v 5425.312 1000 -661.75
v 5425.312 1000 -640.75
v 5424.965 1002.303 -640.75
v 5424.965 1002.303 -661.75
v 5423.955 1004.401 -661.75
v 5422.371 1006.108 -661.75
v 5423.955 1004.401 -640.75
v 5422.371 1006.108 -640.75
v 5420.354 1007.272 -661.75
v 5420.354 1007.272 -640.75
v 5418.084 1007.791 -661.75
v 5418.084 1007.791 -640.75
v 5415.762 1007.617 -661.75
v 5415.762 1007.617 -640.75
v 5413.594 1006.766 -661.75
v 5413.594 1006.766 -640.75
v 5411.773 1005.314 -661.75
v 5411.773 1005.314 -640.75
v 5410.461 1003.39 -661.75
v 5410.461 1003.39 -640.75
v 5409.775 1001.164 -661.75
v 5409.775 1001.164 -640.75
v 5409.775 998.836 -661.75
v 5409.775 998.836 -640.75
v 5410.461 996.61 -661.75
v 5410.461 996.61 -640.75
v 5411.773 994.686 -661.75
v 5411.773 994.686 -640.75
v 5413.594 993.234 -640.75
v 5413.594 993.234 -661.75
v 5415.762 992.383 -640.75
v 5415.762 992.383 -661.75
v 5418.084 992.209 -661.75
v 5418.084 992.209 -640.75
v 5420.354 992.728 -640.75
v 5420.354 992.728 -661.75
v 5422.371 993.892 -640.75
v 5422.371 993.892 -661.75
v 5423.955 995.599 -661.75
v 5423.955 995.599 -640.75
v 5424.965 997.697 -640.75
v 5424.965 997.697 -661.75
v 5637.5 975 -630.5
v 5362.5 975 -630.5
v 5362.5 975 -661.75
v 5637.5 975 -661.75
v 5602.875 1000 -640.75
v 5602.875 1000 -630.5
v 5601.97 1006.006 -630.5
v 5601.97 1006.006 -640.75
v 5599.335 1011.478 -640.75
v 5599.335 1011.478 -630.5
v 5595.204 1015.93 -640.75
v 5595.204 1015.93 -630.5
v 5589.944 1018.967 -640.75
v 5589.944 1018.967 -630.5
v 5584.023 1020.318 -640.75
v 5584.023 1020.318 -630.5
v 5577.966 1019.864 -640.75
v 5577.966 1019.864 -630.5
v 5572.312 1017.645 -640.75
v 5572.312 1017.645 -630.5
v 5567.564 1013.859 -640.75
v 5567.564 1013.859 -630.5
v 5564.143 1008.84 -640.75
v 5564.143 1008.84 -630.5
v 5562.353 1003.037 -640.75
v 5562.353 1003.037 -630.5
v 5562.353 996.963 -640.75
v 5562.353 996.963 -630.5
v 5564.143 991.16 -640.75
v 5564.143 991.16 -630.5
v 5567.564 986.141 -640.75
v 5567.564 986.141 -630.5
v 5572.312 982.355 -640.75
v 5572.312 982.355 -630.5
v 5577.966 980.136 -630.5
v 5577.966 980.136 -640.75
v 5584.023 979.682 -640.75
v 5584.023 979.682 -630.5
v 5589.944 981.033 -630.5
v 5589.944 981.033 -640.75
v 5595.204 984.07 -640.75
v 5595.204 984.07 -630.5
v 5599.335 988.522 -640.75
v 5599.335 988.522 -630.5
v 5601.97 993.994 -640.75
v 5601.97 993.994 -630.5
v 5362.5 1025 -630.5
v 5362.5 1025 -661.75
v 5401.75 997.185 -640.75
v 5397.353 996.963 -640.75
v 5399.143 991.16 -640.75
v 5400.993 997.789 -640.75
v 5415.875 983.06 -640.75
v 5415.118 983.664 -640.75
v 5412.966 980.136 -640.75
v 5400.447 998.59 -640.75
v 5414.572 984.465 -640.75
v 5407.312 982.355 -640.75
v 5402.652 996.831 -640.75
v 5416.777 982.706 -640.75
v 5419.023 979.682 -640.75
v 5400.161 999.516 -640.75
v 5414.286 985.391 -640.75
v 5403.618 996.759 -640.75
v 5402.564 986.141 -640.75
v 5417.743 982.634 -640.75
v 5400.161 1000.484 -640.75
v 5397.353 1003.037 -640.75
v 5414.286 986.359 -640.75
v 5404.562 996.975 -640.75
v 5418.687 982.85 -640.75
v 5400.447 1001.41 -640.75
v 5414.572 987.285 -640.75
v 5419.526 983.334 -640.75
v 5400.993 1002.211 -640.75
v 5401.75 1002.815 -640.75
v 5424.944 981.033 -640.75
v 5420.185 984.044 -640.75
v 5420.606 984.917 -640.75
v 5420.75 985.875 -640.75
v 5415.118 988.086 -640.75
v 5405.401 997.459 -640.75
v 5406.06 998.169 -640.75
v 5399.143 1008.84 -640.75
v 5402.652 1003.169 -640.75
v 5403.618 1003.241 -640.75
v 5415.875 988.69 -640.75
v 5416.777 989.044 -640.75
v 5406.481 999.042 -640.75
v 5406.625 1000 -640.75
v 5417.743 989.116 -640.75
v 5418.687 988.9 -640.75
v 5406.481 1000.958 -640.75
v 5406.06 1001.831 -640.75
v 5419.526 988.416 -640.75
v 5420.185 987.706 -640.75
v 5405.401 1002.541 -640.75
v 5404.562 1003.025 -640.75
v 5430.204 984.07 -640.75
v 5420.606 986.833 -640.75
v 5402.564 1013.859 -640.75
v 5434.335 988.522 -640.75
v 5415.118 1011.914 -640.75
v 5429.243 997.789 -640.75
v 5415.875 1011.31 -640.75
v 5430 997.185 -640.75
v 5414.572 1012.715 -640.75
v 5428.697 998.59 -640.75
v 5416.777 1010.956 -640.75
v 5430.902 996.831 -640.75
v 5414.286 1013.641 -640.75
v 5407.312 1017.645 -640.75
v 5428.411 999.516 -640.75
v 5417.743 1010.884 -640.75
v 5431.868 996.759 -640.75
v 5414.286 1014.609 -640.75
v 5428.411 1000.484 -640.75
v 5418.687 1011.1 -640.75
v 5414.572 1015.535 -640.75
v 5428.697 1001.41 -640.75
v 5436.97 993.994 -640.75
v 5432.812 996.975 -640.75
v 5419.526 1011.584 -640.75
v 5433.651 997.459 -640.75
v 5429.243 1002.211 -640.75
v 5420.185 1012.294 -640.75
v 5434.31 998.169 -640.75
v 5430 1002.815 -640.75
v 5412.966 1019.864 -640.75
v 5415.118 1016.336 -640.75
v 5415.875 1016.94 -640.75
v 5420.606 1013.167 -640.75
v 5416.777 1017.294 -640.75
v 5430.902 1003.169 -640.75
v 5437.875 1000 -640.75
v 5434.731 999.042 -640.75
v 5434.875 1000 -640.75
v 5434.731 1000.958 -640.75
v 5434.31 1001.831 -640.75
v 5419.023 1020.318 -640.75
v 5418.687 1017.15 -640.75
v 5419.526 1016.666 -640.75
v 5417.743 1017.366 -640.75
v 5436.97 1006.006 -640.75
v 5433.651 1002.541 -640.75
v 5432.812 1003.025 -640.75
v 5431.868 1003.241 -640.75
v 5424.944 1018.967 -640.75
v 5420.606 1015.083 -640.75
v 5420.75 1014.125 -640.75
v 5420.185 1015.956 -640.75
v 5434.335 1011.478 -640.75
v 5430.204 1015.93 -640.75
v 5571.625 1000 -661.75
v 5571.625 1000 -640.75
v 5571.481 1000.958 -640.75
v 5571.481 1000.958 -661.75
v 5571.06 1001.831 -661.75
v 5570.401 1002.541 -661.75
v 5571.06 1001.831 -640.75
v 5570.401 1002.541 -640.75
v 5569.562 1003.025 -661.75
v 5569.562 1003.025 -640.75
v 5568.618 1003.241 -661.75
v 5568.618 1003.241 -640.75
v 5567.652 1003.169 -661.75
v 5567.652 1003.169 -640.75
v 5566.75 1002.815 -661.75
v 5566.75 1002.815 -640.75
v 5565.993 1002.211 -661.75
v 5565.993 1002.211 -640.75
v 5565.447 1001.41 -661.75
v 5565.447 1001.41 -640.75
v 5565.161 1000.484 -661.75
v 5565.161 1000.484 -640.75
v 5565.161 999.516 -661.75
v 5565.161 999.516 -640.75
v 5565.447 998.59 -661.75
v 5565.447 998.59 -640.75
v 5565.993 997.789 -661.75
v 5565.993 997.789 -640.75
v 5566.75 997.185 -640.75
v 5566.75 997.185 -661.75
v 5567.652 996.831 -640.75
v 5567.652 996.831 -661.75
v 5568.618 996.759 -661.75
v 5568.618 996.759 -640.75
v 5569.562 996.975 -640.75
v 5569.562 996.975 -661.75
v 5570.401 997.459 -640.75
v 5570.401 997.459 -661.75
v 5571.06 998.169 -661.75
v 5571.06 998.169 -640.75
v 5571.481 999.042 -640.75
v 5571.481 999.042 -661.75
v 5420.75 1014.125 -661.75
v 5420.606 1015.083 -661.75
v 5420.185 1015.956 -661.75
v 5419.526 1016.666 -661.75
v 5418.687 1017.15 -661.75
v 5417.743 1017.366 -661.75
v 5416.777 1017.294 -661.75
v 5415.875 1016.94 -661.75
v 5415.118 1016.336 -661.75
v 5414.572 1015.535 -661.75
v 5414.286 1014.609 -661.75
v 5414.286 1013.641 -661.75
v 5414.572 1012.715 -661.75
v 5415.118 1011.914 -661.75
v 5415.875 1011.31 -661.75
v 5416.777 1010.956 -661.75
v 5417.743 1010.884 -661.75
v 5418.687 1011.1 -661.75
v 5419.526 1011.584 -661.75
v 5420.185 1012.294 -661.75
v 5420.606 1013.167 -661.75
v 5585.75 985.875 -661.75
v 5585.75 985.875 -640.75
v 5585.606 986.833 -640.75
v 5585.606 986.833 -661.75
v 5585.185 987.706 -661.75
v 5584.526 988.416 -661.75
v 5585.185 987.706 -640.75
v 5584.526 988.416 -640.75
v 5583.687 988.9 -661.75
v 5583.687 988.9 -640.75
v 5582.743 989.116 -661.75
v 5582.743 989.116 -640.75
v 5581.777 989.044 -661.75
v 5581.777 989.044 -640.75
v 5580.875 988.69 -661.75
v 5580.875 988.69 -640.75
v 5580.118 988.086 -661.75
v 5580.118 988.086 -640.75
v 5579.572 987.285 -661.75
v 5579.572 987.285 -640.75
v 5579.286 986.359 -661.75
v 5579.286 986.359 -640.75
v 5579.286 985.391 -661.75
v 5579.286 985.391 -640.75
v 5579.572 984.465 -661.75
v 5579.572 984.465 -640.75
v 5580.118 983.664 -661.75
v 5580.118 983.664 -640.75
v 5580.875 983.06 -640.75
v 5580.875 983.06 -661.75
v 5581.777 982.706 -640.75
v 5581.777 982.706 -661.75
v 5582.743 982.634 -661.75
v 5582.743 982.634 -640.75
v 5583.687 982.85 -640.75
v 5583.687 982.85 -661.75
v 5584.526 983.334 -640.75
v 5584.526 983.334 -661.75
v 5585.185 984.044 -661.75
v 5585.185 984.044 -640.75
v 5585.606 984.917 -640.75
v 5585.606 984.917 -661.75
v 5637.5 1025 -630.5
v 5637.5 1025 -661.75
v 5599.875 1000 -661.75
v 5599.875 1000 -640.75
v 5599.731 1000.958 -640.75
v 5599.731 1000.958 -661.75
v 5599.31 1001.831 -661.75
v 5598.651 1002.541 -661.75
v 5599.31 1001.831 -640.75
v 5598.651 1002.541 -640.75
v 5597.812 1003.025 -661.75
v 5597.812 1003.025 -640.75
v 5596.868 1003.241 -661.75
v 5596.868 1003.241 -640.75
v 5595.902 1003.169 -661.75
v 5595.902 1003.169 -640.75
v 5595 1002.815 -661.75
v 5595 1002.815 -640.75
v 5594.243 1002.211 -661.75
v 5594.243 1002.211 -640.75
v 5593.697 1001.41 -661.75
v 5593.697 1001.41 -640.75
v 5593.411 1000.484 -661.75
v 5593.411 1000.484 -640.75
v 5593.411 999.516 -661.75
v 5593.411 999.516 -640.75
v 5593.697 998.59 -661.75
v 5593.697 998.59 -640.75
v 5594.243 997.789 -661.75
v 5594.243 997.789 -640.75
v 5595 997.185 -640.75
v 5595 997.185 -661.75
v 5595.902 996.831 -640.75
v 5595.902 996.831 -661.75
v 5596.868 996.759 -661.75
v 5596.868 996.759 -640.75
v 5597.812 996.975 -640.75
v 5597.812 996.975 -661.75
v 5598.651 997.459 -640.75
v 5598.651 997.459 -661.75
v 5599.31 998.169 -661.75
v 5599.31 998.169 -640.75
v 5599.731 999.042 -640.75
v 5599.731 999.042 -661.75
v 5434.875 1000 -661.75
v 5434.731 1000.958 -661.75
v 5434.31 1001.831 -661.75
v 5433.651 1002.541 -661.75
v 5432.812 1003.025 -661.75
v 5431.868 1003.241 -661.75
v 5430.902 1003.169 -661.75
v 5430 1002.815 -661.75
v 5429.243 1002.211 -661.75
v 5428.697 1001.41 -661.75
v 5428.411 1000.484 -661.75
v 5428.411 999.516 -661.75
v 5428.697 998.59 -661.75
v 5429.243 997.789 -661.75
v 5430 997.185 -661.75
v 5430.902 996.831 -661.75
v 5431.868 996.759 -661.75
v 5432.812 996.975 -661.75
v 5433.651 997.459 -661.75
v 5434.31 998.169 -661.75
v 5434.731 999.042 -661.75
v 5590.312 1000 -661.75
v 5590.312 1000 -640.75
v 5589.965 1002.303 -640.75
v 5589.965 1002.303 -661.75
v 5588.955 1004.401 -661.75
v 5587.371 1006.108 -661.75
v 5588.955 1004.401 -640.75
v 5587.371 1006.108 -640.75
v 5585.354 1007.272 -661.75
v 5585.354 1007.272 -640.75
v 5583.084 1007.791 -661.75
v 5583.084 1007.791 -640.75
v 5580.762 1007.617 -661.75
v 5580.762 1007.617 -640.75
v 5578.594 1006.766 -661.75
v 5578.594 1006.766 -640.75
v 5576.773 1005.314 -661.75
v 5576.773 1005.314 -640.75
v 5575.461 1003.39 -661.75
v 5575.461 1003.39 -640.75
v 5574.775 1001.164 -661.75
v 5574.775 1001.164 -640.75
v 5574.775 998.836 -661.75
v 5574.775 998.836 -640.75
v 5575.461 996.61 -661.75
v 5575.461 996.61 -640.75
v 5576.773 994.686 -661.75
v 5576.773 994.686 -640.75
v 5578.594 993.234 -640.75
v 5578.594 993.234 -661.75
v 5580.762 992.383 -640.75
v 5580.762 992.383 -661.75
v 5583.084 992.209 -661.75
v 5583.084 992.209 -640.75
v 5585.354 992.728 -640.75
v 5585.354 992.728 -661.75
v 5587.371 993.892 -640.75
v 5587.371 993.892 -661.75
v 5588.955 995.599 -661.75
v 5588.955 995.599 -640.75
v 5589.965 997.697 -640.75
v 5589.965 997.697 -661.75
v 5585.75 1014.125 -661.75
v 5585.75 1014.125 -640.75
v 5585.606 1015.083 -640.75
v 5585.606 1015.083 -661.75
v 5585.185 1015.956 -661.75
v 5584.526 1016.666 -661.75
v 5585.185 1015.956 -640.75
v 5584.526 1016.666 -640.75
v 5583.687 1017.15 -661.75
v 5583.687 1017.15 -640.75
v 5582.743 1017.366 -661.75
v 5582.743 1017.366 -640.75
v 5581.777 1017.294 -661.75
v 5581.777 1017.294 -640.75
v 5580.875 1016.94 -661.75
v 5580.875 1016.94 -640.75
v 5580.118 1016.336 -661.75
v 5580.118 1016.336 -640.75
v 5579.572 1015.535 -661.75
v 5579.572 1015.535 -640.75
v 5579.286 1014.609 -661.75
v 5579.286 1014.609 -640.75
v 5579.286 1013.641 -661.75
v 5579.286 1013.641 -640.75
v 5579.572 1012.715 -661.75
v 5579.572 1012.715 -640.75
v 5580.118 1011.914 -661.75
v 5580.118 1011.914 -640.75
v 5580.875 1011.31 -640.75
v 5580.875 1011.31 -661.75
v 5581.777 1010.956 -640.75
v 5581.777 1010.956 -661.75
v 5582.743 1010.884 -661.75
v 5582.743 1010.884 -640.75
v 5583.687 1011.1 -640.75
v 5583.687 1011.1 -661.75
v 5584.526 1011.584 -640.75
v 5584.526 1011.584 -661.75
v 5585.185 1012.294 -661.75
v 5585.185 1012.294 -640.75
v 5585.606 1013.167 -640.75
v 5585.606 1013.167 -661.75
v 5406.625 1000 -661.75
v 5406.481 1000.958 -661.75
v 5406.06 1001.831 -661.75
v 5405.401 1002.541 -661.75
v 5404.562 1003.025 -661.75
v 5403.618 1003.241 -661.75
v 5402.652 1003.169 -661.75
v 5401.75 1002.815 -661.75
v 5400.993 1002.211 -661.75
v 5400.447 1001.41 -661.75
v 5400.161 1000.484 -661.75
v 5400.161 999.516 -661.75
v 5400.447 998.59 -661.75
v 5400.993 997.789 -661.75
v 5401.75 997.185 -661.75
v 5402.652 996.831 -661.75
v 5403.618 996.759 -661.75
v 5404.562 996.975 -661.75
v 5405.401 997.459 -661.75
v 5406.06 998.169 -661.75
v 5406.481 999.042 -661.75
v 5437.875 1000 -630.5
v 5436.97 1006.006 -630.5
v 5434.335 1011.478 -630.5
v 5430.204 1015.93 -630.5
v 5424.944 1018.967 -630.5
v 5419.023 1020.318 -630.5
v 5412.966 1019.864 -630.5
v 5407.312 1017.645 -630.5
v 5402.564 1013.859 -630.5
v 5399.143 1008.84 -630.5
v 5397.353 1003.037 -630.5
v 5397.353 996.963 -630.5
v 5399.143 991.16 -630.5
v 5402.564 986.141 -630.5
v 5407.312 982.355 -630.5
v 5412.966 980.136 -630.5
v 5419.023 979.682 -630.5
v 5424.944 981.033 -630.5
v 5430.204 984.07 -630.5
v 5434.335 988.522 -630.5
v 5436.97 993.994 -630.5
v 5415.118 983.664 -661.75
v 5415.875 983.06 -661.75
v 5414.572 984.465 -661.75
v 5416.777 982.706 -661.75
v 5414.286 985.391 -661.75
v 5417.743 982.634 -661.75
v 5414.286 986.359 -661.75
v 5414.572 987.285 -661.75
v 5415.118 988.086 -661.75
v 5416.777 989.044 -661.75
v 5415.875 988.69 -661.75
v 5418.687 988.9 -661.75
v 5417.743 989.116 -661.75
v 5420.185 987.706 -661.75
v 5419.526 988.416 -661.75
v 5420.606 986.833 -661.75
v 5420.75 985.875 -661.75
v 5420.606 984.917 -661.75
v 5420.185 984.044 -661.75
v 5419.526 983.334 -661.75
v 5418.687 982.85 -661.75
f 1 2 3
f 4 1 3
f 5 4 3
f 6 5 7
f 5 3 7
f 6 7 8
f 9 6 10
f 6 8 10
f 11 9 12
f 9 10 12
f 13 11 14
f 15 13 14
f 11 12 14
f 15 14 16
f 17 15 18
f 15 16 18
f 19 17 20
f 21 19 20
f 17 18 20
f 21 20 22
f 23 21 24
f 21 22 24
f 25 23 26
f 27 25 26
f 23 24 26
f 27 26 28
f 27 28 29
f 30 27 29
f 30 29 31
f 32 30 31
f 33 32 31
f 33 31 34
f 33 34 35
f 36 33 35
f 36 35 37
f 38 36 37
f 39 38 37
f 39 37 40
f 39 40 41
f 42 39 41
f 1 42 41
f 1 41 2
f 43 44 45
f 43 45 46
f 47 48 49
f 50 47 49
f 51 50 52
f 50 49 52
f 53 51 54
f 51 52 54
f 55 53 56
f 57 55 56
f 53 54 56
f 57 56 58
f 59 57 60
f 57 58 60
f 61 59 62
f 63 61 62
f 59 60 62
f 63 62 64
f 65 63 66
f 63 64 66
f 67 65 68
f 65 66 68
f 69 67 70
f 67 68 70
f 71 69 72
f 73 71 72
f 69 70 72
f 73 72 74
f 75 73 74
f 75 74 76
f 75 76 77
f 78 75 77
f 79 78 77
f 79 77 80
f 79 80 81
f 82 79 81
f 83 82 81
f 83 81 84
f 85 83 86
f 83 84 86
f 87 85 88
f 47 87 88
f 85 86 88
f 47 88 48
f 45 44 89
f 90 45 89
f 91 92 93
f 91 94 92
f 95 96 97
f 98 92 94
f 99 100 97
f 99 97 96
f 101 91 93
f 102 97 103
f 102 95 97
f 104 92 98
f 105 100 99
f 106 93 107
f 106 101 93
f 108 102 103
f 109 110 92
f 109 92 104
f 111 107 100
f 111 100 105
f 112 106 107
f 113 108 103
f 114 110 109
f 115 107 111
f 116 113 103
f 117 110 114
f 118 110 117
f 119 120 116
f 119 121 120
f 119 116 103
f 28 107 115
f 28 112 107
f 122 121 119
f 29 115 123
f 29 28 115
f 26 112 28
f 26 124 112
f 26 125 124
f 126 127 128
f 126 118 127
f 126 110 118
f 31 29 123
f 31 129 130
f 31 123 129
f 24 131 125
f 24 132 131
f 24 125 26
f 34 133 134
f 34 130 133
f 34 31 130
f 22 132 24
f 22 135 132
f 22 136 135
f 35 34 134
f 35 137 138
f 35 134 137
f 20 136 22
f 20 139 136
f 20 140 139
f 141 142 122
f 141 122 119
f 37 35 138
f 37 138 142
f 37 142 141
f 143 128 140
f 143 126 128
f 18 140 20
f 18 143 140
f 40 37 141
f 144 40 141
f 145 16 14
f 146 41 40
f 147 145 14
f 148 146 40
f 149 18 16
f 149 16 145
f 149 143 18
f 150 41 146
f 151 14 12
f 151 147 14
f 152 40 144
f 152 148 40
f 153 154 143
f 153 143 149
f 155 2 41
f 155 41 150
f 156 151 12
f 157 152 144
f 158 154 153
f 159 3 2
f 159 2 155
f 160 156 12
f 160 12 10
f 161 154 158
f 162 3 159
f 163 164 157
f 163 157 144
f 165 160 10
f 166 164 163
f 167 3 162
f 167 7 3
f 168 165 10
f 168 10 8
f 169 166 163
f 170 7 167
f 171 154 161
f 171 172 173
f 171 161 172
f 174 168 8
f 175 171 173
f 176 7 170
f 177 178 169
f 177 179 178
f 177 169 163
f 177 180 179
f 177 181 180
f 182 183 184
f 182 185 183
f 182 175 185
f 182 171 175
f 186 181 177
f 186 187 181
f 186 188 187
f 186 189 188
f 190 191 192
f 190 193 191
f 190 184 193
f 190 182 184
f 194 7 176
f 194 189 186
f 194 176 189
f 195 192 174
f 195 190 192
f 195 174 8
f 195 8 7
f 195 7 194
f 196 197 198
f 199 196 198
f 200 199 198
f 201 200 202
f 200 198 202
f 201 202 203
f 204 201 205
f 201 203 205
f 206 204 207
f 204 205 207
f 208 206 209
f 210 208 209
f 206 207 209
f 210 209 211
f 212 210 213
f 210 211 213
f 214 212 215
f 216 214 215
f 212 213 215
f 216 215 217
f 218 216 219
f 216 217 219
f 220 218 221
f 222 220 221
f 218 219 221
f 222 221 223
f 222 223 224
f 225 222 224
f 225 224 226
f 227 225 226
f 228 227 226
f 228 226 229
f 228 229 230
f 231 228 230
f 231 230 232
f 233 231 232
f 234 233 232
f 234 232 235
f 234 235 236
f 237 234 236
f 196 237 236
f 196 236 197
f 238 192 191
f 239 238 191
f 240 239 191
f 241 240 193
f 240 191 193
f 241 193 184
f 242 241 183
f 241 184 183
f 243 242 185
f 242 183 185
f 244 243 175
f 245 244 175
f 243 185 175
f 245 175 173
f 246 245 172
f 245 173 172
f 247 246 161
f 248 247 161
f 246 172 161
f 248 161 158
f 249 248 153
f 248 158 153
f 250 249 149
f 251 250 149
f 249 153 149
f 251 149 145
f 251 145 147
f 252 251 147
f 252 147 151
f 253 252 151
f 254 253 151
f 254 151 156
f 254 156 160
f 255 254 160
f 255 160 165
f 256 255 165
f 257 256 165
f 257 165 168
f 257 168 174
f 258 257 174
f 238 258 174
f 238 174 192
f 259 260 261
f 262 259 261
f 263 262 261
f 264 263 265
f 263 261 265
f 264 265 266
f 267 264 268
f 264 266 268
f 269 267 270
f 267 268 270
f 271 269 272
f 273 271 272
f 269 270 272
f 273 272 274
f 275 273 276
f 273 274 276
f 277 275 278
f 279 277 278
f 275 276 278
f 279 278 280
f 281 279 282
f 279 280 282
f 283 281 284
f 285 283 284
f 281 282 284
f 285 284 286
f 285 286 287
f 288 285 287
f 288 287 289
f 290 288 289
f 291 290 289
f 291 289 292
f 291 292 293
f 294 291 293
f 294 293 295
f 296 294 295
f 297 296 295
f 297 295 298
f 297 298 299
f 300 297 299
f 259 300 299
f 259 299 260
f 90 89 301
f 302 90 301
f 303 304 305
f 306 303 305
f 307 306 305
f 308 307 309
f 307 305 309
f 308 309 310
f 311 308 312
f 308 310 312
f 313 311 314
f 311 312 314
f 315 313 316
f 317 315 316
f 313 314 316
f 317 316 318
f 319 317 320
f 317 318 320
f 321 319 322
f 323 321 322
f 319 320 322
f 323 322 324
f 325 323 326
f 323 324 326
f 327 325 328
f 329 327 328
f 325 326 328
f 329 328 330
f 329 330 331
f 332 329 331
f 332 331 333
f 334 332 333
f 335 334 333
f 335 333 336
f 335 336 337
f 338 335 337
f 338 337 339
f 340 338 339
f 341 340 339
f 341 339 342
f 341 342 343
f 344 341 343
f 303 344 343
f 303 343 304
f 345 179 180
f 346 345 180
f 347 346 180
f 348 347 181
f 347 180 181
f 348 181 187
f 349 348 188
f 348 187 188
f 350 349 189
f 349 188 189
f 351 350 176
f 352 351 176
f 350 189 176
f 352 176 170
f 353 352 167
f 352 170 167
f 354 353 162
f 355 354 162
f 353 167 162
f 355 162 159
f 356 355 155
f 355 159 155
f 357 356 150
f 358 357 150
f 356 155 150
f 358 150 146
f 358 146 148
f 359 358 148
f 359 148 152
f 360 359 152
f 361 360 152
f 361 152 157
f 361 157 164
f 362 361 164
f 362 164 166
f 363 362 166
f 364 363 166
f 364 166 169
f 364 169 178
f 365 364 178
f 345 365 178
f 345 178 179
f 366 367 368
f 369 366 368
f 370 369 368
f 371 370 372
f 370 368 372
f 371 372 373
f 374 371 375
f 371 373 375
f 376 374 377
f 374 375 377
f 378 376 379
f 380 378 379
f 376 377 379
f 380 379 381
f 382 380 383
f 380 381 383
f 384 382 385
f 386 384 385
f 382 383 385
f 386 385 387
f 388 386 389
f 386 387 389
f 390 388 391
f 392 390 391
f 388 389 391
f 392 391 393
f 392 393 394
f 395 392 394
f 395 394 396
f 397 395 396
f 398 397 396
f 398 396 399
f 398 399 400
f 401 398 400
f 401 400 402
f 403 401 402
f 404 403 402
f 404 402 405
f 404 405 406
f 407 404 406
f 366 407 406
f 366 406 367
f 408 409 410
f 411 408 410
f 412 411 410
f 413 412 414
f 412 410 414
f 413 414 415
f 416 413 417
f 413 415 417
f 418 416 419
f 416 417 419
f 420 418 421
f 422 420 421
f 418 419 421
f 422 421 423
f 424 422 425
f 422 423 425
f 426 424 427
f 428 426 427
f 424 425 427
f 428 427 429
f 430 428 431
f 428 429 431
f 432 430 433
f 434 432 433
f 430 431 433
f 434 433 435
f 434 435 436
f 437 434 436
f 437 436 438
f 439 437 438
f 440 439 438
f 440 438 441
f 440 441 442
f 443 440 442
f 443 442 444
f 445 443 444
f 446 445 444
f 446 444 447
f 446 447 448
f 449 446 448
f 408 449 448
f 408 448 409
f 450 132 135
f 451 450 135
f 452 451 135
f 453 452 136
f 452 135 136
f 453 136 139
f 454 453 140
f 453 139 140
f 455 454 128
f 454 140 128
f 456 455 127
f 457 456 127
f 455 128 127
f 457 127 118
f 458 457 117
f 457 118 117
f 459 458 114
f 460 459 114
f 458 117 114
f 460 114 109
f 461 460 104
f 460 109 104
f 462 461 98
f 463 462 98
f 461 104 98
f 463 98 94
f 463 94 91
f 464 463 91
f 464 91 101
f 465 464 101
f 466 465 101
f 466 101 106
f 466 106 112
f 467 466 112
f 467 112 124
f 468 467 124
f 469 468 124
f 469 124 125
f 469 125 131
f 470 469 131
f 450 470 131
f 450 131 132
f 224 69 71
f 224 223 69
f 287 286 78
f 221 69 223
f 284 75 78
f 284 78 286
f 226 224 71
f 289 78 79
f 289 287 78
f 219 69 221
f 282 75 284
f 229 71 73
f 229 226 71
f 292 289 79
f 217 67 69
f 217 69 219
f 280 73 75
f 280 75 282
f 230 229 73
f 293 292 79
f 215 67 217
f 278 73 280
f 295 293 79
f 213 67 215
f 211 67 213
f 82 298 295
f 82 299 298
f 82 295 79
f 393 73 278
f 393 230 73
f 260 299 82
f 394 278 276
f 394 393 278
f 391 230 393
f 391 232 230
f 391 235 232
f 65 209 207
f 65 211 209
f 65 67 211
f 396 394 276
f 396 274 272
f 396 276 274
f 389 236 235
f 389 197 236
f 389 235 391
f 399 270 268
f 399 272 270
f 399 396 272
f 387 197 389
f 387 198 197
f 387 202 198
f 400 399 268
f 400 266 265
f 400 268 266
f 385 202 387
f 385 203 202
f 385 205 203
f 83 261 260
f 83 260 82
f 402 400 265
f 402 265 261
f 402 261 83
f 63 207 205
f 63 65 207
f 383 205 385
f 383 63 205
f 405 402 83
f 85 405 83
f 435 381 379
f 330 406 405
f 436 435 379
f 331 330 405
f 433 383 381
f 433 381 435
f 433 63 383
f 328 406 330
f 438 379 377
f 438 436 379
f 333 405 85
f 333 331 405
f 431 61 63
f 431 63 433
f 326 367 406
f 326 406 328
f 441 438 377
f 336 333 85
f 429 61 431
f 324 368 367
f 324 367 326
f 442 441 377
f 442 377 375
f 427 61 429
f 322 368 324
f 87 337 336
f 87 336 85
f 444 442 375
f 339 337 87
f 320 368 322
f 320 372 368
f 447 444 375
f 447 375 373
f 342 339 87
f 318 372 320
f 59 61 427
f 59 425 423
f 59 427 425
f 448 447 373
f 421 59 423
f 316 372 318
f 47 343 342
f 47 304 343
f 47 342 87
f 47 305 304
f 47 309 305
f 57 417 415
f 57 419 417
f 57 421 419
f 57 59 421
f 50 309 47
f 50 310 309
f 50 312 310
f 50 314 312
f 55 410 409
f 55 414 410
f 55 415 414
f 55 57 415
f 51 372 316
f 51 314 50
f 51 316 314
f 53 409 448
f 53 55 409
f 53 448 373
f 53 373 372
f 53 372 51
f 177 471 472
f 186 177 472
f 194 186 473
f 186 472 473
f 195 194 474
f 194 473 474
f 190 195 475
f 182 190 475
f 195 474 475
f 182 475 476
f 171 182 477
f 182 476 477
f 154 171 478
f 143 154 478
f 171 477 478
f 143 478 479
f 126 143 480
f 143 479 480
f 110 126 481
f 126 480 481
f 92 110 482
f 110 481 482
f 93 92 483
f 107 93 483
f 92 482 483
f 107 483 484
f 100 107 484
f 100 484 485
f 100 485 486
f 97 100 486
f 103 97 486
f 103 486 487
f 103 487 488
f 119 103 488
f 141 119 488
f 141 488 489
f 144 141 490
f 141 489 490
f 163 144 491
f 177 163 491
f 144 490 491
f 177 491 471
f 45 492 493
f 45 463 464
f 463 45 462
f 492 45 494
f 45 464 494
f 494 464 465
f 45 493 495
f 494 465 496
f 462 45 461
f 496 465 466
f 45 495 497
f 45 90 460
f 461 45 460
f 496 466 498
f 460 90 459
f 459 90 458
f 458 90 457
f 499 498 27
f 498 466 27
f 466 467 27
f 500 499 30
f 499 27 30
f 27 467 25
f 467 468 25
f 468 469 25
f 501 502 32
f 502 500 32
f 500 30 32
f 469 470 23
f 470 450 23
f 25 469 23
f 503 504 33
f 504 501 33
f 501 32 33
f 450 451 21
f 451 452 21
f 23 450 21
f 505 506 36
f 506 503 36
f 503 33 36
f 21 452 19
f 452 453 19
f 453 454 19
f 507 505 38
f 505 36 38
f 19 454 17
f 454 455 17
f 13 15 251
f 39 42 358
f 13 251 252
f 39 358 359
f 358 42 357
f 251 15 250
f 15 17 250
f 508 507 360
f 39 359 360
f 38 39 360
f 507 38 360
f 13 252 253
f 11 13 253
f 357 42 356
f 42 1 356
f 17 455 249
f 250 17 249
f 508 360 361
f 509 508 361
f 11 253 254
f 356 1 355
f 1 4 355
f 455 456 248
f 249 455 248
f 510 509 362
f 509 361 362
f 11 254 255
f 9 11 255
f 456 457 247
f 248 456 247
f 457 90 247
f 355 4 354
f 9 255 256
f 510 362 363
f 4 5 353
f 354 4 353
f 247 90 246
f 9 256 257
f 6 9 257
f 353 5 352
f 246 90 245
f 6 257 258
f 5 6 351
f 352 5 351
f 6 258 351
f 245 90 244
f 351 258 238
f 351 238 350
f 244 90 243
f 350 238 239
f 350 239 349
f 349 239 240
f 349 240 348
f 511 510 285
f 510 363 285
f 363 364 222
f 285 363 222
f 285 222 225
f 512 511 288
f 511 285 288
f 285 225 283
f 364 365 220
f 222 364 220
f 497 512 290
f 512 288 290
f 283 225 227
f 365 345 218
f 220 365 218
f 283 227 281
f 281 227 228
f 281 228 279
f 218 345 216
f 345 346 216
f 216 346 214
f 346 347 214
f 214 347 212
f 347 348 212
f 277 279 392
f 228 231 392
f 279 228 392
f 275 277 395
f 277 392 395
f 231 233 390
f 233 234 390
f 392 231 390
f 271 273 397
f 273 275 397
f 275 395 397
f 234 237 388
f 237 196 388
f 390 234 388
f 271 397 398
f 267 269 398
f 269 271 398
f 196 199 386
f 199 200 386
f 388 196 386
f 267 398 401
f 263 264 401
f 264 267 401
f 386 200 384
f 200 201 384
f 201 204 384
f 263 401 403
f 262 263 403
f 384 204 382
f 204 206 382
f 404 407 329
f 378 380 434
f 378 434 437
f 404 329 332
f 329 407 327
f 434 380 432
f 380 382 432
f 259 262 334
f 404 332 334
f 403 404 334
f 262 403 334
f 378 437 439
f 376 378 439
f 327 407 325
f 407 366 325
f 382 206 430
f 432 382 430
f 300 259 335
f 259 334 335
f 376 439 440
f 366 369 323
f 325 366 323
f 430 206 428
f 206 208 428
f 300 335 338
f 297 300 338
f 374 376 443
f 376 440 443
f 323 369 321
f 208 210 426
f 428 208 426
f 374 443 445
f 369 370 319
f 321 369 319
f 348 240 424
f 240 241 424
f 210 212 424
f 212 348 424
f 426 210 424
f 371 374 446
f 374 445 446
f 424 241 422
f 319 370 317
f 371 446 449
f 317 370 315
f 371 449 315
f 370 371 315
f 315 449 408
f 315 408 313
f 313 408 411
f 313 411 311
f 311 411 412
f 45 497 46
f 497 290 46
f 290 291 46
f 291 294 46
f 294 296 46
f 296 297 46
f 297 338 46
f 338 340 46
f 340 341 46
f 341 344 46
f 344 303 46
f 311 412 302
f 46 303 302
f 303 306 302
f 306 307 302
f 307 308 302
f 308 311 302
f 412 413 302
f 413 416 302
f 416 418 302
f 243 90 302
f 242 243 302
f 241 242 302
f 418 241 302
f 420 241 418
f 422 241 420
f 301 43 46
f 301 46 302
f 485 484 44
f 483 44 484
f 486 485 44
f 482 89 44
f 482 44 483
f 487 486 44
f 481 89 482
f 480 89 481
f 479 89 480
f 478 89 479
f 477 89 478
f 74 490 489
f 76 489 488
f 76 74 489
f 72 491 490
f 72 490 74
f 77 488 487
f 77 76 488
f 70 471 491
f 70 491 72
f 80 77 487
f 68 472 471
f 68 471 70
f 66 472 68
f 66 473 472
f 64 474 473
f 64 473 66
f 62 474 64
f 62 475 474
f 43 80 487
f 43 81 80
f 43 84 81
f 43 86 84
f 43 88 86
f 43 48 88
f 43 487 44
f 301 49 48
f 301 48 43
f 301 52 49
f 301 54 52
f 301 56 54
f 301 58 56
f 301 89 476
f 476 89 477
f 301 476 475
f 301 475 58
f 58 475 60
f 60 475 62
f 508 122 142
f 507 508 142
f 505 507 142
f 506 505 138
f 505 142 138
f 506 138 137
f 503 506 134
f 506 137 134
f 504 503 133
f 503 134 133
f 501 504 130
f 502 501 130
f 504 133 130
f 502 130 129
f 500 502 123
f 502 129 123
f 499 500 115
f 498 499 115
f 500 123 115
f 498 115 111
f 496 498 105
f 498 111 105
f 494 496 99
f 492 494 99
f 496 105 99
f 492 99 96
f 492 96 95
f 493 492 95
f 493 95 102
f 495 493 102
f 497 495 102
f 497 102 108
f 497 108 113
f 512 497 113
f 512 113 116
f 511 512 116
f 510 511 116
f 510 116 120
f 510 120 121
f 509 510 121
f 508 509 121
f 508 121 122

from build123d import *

# Parameters (mm, degrees)
SKETCH1_W           = 11000
SKETCH1_H           = 2000
BOSS_EXTRUDE1_DEPTH = 1250
SKETCH2_R           = 815
CUT_EXTRUDE2_DEPTH  = 410
SKETCH23_R          = 312.5
CUT_EXTRUDE3_DEPTH  = 11251
SKETCH24_R          = 130
CUT_EXTRUDE4_DEPTH  = 11251
SKETCH25_R          = 130
CUT_EXTRUDE5_DEPTH  = 11251
SCALE1_SCALE        = 0.025


with BuildPart() as part:
    # Sketch1 → Boss-Extrude1 (new body)
    with BuildSketch(Plane.XY):
        with Locations((5500, 1000)):
            Rectangle(SKETCH1_W, SKETCH1_H)
    extrude(amount=-BOSS_EXTRUDE1_DEPTH)

    # Sketch2 → Cut-Extrude2 (cut)
    with BuildSketch(Plane.XY):
        with Locations((2200, 1000)):
            Circle(SKETCH2_R)
        with Locations((8800, 1000)):
            Circle(SKETCH2_R)
    extrude(amount=-CUT_EXTRUDE2_DEPTH, mode=Mode.SUBTRACT)

    # Sketch23 → Cut-Extrude3 (cut, through all)
    with BuildSketch(Plane.XY):
        with Locations((2200, 1000)):
            Circle(SKETCH23_R)
        with Locations((8800, 1000)):
            Circle(SKETCH23_R)
    extrude(amount=-CUT_EXTRUDE3_DEPTH, mode=Mode.SUBTRACT)

    # Sketch24 → Cut-Extrude4 (cut, through all)
    with BuildSketch(Plane.XY):
        with Locations((2200, 435)):
            Circle(SKETCH24_R)
        with Locations((1635, 1000)):
            Circle(SKETCH24_R)
        with Locations((2200, 1565)):
            Circle(SKETCH24_R)
        with Locations((2765, 1000)):
            Circle(SKETCH24_R)
    extrude(amount=-CUT_EXTRUDE4_DEPTH, mode=Mode.SUBTRACT)

    # Sketch25 → Cut-Extrude5 (cut, through all)
    with BuildSketch(Plane.XY):
        with Locations((8800, 435)):
            Circle(SKETCH25_R)
        with Locations((8235, 1000)):
            Circle(SKETCH25_R)
        with Locations((8800, 1565)):
            Circle(SKETCH25_R)
        with Locations((9365, 1000)):
            Circle(SKETCH25_R)
    extrude(amount=-CUT_EXTRUDE5_DEPTH, mode=Mode.SUBTRACT)


with BuildPart() as part_1:
    # Scale1: scaled about (5500, 1000, -646.66686697)
    add(part.part.scale(SCALE1_SCALE).moved(Location((5362.5, 975, -630.500195296))))


solid = part_1.part
